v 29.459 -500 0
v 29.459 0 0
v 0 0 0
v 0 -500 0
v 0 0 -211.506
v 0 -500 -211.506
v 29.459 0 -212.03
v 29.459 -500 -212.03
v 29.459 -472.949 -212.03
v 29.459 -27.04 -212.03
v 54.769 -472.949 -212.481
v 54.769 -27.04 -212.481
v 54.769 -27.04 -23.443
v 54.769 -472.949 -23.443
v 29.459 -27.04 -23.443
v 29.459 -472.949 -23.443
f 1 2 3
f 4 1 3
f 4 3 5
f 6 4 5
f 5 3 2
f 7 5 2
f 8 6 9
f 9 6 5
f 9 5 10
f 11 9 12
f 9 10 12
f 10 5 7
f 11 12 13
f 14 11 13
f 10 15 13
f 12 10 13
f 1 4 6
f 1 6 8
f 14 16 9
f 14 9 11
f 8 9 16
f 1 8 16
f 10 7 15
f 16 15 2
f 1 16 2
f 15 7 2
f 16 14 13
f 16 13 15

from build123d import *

# Parameters (mm, degrees)
F1_DEPTH   = 500
F2_W       = 25.3097712994
F2_H       = 27.039706707
F1_FACE1_W = 54.7773372423
F1_FACE1_H = 500
F3_DEPTH   = 189.0395001898
F4_W       = 25.3097712994
F4_H       = 27.051
F5_DEPTH   = 189.0395001898


with BuildPart() as f1:
    # F0 (on Front) → F1 (new body)
    with BuildSketch(Plane.XZ):
        Polygon((29.4588804245, 0), (0, 0), (0, -211.5057110786), (54.7686517239, -212.4811410904), (54.7686517239, -64.9340748787), (54.7686517239, -23.4426409006), (29.4588804245, -23.4426409006), align=None)
    extrude(amount=F1_DEPTH)

    # F2 (on face) + F1_face1 (on face) → F3 (cut, through all)
    with BuildSketch(Plane.XY.offset(-23.4426409006)):
        with Locations((42.1137660742, -13.5198533535)):
            Rectangle(F2_W, F2_H)
    with BuildSketch(Plane(origin=(27.3843258619, -250, -211.9934260845), x_dir=(1, 0, 0), z_dir=(-0.017807182, 0, -0.9998414396))):
        Rectangle(F1_FACE1_W, F1_FACE1_H)
    extrude(amount=-F3_DEPTH, dir=(0, 0, 1), mode=Mode.SUBTRACT)

    # F4 (on face) → F5 (cut, through all)
    with BuildSketch(Plane.XY.offset(-23.4426409006)):
        with Locations((42.1137660742, -486.4745)):
            Rectangle(F4_W, F4_H)
    extrude(amount=-F5_DEPTH, mode=Mode.SUBTRACT)


solid = f1.part
